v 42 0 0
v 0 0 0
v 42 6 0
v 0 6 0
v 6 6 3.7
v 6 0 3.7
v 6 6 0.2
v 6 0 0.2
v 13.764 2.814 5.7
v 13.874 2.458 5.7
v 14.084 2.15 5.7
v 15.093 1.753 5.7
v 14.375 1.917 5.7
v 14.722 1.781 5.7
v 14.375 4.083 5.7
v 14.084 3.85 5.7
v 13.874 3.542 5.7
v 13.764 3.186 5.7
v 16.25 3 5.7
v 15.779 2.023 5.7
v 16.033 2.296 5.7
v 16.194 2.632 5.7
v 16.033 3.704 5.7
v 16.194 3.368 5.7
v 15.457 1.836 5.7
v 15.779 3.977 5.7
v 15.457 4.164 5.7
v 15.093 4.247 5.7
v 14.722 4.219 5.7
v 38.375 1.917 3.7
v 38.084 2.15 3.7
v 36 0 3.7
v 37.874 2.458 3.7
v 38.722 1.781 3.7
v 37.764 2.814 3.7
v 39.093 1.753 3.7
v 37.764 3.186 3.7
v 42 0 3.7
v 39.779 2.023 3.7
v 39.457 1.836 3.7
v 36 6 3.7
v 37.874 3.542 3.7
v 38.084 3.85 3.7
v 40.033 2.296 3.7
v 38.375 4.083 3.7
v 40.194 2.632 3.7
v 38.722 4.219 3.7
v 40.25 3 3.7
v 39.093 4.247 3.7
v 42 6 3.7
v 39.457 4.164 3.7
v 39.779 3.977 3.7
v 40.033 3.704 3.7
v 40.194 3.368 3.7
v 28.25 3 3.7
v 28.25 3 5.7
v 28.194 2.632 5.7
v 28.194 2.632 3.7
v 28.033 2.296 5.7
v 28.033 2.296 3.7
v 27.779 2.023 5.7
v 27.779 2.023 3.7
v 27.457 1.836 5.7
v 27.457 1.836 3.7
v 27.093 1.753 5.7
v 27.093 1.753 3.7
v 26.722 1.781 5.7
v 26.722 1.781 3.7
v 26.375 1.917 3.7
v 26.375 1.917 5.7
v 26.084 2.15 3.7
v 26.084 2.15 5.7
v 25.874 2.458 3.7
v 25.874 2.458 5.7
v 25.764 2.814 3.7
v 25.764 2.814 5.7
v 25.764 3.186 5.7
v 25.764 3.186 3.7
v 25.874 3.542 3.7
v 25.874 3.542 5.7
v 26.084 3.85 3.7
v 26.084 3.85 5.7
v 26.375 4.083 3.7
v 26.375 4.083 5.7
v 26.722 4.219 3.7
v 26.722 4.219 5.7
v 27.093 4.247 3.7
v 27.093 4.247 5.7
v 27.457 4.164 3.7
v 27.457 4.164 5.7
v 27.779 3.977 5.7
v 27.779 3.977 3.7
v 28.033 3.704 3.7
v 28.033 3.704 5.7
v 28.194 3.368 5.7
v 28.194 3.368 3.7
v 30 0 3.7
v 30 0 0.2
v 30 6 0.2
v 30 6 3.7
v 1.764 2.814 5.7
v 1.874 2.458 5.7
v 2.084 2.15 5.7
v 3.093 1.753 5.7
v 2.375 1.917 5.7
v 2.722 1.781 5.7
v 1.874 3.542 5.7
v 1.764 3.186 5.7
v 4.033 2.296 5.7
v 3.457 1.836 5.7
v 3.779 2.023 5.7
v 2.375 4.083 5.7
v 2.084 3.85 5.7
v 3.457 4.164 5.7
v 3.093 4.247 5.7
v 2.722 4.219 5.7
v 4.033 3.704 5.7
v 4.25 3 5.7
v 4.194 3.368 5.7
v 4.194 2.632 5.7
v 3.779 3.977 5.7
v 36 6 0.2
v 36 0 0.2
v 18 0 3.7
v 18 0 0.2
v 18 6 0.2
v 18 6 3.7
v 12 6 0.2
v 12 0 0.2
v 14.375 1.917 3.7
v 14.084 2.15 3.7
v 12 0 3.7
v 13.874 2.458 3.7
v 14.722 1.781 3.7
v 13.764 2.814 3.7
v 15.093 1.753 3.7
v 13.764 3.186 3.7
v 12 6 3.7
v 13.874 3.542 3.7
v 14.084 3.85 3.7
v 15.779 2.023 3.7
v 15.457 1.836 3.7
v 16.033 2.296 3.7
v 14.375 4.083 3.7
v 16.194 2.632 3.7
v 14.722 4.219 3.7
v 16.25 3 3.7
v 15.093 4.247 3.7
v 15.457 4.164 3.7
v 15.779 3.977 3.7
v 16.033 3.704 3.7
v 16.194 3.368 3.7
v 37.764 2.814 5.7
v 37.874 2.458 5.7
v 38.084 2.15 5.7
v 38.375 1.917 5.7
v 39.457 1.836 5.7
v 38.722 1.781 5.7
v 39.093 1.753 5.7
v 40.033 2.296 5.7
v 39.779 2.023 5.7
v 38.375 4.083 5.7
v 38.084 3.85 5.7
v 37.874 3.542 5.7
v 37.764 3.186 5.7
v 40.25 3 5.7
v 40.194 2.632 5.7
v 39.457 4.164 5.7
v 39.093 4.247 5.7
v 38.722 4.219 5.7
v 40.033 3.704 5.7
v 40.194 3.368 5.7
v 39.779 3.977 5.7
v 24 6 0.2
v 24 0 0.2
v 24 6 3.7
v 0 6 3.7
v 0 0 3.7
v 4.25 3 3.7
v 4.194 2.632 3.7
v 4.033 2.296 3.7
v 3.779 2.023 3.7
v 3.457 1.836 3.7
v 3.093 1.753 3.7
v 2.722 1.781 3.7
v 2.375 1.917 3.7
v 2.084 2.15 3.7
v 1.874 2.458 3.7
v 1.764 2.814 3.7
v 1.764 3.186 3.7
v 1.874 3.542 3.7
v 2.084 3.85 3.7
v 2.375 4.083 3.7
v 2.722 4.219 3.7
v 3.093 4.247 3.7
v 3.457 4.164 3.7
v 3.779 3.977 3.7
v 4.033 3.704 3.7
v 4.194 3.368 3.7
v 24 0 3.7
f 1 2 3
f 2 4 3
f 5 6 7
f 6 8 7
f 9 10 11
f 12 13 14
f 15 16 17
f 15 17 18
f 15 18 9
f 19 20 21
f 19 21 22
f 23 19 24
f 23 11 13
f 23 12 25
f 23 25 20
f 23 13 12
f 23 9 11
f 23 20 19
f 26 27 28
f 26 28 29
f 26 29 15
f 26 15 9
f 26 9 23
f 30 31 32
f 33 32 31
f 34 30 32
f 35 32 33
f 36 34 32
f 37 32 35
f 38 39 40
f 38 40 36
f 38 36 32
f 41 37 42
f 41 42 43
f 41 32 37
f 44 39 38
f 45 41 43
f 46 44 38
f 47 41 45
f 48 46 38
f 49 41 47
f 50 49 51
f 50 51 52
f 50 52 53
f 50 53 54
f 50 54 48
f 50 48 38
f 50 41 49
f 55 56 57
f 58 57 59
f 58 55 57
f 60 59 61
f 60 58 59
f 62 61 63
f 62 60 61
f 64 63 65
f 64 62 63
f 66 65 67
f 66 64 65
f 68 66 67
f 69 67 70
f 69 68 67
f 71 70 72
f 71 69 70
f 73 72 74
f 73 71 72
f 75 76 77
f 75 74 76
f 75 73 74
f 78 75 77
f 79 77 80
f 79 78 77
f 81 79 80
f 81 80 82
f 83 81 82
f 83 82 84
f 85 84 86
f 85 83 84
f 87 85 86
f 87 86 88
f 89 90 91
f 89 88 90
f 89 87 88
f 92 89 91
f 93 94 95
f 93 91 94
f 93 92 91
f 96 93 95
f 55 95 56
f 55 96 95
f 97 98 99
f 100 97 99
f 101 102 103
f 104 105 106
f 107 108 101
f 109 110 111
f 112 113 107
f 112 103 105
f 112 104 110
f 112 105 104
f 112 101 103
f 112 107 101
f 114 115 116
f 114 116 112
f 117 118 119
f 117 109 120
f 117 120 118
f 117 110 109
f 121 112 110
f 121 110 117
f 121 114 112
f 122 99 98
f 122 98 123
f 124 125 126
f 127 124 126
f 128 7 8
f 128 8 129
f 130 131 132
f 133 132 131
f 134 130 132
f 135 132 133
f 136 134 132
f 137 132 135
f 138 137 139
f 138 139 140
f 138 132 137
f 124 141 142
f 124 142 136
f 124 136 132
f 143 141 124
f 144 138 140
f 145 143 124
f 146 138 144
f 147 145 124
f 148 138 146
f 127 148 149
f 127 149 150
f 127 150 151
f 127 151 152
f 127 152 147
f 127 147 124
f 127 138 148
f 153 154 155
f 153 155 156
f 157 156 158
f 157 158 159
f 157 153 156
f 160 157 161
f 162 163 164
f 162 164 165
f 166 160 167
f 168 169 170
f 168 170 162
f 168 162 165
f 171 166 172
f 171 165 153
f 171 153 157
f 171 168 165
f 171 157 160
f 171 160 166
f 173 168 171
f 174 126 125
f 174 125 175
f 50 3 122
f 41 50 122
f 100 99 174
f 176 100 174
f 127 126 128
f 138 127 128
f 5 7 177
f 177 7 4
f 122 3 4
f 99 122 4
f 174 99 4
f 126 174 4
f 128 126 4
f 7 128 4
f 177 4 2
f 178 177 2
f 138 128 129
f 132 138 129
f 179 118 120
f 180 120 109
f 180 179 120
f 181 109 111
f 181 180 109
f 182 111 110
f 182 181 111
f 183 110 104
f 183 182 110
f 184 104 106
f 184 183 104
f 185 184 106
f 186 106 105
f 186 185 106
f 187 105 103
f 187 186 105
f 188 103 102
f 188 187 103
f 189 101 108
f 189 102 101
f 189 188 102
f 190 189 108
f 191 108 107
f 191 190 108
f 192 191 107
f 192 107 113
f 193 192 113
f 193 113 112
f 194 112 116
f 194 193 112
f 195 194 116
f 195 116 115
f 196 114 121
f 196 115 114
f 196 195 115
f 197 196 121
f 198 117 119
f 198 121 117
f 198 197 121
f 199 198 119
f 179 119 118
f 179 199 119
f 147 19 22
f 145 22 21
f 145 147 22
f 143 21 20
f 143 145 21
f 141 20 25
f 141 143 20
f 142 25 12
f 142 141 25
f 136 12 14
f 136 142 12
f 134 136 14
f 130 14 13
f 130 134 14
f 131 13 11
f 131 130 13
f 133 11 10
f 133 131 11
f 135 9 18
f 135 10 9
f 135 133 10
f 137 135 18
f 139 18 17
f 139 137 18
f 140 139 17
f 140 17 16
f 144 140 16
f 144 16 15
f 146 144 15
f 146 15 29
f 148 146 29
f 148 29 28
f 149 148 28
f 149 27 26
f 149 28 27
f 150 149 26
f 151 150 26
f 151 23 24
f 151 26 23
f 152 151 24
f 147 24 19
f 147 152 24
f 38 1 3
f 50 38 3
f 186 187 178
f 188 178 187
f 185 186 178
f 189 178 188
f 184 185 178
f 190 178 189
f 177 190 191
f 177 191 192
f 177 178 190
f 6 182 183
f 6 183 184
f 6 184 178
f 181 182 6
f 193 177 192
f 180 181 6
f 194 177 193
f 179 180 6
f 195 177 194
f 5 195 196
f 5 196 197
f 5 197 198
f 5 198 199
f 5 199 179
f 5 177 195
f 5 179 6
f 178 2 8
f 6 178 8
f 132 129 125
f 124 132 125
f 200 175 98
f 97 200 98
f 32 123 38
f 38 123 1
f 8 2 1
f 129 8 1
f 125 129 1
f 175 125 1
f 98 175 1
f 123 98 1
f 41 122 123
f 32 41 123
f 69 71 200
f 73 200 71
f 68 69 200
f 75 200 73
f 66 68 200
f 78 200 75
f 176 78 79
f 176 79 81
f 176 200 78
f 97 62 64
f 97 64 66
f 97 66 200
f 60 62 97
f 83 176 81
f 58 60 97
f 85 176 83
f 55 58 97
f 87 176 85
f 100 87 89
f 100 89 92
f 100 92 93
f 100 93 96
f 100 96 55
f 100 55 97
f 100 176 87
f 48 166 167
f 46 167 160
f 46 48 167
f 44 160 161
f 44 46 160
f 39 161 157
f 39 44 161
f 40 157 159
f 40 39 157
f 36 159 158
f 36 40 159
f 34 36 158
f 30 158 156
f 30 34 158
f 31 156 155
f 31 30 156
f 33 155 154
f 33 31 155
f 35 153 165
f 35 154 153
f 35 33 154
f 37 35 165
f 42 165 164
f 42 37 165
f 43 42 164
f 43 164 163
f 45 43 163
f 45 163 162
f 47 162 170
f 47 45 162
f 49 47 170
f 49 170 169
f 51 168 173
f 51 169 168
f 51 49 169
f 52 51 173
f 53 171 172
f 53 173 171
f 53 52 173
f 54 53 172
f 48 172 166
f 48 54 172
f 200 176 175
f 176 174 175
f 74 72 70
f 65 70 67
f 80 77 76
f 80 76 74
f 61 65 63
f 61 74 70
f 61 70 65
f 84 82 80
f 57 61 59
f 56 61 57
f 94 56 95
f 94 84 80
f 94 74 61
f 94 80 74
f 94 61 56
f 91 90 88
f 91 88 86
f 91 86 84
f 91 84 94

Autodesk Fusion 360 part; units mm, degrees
sketch "Sketch1" plane through (0, 0, 0) normal (0, 0, 1) x (1, 0, 0)
  line L0 (0, 0) -> (6, 0)
  line L1 (6, 0) -> (6, 6)
  line L2 (6, 6) -> (0, 6)
  line L3 (0, 6) -> (0, 0)
  line L4 (12, 0) -> (18, 0)
  line L5 (18, 0) -> (18, 6)
  line L6 (18, 6) -> (12, 6)
  line L7 (12, 6) -> (12, 0)
  line L8 (24, 0) -> (30, 0)
  line L9 (30, 0) -> (30, 6)
  line L10 (30, 6) -> (24, 6)
  line L11 (24, 6) -> (24, 0)
  line L12 (36, 0) -> (42, 0)
  line L13 (42, 0) -> (42, 6)
  line L14 (42, 6) -> (36, 6)
  line L15 (36, 6) -> (36, 0)
  line L16 (0, 0) -> (42, 0)
  line L17 (42, 0) -> (42, 6)
  line L18 (42, 6) -> (0, 6)
  line L19 (0, 6) -> (0, 0)
  circle A0 centre (3, 3) radius 1.25
  circle A1 centre (15, 3) radius 1.25
  circle A2 centre (27, 3) radius 1.25
  circle A3 centre (39, 3) radius 1.25
  dimension "d1" = 6
  dimension "d2" = 6
  dimension "d5" = 6
  dimension "d6" = 6
  dimension "d7" = 6
  dimension "d8" = 6
  dimension "d9" = 6
  dimension "d10" = 6
  dimension "d11" = 6
  dimension "d12" = 6
  dimension "d13" = 6
  dimension "d18" = 2.5
  dimension "d19" = 2.5
  dimension "d20" = 2.5
  dimension "d21" = 2.5
extrude "Extrude2" add sketch "Sketch1" along normal blind 0.2 contours L0 L1 L2 L3 L16 L18 L19 | L1 L7 L16 L18 | L4 L5 L6 L7 L16 L18 | L5 L11 L16 L18 | L8 L9 L10 L11 L16 L18 | L9 L15 L16 L18 | L12 L13 L14 L15 L16 L17 L18 | A0 | A1 | A2 | A3
extrude "Extrude3" add sketch "Sketch1" along normal blind 3.7 contours L0 L1 L2 L3 L16 L18 L19 | L4 L5 L6 L7 L16 L18 | L8 L9 L10 L11 L16 L18 | L12 L13 L14 L15 L16 L17 L18 | A0 | A1 | A2 | A3
extrude "Extrude4" add sketch "Sketch1" along normal blind 5.7 contours A0 | A1 | A2 | A3
